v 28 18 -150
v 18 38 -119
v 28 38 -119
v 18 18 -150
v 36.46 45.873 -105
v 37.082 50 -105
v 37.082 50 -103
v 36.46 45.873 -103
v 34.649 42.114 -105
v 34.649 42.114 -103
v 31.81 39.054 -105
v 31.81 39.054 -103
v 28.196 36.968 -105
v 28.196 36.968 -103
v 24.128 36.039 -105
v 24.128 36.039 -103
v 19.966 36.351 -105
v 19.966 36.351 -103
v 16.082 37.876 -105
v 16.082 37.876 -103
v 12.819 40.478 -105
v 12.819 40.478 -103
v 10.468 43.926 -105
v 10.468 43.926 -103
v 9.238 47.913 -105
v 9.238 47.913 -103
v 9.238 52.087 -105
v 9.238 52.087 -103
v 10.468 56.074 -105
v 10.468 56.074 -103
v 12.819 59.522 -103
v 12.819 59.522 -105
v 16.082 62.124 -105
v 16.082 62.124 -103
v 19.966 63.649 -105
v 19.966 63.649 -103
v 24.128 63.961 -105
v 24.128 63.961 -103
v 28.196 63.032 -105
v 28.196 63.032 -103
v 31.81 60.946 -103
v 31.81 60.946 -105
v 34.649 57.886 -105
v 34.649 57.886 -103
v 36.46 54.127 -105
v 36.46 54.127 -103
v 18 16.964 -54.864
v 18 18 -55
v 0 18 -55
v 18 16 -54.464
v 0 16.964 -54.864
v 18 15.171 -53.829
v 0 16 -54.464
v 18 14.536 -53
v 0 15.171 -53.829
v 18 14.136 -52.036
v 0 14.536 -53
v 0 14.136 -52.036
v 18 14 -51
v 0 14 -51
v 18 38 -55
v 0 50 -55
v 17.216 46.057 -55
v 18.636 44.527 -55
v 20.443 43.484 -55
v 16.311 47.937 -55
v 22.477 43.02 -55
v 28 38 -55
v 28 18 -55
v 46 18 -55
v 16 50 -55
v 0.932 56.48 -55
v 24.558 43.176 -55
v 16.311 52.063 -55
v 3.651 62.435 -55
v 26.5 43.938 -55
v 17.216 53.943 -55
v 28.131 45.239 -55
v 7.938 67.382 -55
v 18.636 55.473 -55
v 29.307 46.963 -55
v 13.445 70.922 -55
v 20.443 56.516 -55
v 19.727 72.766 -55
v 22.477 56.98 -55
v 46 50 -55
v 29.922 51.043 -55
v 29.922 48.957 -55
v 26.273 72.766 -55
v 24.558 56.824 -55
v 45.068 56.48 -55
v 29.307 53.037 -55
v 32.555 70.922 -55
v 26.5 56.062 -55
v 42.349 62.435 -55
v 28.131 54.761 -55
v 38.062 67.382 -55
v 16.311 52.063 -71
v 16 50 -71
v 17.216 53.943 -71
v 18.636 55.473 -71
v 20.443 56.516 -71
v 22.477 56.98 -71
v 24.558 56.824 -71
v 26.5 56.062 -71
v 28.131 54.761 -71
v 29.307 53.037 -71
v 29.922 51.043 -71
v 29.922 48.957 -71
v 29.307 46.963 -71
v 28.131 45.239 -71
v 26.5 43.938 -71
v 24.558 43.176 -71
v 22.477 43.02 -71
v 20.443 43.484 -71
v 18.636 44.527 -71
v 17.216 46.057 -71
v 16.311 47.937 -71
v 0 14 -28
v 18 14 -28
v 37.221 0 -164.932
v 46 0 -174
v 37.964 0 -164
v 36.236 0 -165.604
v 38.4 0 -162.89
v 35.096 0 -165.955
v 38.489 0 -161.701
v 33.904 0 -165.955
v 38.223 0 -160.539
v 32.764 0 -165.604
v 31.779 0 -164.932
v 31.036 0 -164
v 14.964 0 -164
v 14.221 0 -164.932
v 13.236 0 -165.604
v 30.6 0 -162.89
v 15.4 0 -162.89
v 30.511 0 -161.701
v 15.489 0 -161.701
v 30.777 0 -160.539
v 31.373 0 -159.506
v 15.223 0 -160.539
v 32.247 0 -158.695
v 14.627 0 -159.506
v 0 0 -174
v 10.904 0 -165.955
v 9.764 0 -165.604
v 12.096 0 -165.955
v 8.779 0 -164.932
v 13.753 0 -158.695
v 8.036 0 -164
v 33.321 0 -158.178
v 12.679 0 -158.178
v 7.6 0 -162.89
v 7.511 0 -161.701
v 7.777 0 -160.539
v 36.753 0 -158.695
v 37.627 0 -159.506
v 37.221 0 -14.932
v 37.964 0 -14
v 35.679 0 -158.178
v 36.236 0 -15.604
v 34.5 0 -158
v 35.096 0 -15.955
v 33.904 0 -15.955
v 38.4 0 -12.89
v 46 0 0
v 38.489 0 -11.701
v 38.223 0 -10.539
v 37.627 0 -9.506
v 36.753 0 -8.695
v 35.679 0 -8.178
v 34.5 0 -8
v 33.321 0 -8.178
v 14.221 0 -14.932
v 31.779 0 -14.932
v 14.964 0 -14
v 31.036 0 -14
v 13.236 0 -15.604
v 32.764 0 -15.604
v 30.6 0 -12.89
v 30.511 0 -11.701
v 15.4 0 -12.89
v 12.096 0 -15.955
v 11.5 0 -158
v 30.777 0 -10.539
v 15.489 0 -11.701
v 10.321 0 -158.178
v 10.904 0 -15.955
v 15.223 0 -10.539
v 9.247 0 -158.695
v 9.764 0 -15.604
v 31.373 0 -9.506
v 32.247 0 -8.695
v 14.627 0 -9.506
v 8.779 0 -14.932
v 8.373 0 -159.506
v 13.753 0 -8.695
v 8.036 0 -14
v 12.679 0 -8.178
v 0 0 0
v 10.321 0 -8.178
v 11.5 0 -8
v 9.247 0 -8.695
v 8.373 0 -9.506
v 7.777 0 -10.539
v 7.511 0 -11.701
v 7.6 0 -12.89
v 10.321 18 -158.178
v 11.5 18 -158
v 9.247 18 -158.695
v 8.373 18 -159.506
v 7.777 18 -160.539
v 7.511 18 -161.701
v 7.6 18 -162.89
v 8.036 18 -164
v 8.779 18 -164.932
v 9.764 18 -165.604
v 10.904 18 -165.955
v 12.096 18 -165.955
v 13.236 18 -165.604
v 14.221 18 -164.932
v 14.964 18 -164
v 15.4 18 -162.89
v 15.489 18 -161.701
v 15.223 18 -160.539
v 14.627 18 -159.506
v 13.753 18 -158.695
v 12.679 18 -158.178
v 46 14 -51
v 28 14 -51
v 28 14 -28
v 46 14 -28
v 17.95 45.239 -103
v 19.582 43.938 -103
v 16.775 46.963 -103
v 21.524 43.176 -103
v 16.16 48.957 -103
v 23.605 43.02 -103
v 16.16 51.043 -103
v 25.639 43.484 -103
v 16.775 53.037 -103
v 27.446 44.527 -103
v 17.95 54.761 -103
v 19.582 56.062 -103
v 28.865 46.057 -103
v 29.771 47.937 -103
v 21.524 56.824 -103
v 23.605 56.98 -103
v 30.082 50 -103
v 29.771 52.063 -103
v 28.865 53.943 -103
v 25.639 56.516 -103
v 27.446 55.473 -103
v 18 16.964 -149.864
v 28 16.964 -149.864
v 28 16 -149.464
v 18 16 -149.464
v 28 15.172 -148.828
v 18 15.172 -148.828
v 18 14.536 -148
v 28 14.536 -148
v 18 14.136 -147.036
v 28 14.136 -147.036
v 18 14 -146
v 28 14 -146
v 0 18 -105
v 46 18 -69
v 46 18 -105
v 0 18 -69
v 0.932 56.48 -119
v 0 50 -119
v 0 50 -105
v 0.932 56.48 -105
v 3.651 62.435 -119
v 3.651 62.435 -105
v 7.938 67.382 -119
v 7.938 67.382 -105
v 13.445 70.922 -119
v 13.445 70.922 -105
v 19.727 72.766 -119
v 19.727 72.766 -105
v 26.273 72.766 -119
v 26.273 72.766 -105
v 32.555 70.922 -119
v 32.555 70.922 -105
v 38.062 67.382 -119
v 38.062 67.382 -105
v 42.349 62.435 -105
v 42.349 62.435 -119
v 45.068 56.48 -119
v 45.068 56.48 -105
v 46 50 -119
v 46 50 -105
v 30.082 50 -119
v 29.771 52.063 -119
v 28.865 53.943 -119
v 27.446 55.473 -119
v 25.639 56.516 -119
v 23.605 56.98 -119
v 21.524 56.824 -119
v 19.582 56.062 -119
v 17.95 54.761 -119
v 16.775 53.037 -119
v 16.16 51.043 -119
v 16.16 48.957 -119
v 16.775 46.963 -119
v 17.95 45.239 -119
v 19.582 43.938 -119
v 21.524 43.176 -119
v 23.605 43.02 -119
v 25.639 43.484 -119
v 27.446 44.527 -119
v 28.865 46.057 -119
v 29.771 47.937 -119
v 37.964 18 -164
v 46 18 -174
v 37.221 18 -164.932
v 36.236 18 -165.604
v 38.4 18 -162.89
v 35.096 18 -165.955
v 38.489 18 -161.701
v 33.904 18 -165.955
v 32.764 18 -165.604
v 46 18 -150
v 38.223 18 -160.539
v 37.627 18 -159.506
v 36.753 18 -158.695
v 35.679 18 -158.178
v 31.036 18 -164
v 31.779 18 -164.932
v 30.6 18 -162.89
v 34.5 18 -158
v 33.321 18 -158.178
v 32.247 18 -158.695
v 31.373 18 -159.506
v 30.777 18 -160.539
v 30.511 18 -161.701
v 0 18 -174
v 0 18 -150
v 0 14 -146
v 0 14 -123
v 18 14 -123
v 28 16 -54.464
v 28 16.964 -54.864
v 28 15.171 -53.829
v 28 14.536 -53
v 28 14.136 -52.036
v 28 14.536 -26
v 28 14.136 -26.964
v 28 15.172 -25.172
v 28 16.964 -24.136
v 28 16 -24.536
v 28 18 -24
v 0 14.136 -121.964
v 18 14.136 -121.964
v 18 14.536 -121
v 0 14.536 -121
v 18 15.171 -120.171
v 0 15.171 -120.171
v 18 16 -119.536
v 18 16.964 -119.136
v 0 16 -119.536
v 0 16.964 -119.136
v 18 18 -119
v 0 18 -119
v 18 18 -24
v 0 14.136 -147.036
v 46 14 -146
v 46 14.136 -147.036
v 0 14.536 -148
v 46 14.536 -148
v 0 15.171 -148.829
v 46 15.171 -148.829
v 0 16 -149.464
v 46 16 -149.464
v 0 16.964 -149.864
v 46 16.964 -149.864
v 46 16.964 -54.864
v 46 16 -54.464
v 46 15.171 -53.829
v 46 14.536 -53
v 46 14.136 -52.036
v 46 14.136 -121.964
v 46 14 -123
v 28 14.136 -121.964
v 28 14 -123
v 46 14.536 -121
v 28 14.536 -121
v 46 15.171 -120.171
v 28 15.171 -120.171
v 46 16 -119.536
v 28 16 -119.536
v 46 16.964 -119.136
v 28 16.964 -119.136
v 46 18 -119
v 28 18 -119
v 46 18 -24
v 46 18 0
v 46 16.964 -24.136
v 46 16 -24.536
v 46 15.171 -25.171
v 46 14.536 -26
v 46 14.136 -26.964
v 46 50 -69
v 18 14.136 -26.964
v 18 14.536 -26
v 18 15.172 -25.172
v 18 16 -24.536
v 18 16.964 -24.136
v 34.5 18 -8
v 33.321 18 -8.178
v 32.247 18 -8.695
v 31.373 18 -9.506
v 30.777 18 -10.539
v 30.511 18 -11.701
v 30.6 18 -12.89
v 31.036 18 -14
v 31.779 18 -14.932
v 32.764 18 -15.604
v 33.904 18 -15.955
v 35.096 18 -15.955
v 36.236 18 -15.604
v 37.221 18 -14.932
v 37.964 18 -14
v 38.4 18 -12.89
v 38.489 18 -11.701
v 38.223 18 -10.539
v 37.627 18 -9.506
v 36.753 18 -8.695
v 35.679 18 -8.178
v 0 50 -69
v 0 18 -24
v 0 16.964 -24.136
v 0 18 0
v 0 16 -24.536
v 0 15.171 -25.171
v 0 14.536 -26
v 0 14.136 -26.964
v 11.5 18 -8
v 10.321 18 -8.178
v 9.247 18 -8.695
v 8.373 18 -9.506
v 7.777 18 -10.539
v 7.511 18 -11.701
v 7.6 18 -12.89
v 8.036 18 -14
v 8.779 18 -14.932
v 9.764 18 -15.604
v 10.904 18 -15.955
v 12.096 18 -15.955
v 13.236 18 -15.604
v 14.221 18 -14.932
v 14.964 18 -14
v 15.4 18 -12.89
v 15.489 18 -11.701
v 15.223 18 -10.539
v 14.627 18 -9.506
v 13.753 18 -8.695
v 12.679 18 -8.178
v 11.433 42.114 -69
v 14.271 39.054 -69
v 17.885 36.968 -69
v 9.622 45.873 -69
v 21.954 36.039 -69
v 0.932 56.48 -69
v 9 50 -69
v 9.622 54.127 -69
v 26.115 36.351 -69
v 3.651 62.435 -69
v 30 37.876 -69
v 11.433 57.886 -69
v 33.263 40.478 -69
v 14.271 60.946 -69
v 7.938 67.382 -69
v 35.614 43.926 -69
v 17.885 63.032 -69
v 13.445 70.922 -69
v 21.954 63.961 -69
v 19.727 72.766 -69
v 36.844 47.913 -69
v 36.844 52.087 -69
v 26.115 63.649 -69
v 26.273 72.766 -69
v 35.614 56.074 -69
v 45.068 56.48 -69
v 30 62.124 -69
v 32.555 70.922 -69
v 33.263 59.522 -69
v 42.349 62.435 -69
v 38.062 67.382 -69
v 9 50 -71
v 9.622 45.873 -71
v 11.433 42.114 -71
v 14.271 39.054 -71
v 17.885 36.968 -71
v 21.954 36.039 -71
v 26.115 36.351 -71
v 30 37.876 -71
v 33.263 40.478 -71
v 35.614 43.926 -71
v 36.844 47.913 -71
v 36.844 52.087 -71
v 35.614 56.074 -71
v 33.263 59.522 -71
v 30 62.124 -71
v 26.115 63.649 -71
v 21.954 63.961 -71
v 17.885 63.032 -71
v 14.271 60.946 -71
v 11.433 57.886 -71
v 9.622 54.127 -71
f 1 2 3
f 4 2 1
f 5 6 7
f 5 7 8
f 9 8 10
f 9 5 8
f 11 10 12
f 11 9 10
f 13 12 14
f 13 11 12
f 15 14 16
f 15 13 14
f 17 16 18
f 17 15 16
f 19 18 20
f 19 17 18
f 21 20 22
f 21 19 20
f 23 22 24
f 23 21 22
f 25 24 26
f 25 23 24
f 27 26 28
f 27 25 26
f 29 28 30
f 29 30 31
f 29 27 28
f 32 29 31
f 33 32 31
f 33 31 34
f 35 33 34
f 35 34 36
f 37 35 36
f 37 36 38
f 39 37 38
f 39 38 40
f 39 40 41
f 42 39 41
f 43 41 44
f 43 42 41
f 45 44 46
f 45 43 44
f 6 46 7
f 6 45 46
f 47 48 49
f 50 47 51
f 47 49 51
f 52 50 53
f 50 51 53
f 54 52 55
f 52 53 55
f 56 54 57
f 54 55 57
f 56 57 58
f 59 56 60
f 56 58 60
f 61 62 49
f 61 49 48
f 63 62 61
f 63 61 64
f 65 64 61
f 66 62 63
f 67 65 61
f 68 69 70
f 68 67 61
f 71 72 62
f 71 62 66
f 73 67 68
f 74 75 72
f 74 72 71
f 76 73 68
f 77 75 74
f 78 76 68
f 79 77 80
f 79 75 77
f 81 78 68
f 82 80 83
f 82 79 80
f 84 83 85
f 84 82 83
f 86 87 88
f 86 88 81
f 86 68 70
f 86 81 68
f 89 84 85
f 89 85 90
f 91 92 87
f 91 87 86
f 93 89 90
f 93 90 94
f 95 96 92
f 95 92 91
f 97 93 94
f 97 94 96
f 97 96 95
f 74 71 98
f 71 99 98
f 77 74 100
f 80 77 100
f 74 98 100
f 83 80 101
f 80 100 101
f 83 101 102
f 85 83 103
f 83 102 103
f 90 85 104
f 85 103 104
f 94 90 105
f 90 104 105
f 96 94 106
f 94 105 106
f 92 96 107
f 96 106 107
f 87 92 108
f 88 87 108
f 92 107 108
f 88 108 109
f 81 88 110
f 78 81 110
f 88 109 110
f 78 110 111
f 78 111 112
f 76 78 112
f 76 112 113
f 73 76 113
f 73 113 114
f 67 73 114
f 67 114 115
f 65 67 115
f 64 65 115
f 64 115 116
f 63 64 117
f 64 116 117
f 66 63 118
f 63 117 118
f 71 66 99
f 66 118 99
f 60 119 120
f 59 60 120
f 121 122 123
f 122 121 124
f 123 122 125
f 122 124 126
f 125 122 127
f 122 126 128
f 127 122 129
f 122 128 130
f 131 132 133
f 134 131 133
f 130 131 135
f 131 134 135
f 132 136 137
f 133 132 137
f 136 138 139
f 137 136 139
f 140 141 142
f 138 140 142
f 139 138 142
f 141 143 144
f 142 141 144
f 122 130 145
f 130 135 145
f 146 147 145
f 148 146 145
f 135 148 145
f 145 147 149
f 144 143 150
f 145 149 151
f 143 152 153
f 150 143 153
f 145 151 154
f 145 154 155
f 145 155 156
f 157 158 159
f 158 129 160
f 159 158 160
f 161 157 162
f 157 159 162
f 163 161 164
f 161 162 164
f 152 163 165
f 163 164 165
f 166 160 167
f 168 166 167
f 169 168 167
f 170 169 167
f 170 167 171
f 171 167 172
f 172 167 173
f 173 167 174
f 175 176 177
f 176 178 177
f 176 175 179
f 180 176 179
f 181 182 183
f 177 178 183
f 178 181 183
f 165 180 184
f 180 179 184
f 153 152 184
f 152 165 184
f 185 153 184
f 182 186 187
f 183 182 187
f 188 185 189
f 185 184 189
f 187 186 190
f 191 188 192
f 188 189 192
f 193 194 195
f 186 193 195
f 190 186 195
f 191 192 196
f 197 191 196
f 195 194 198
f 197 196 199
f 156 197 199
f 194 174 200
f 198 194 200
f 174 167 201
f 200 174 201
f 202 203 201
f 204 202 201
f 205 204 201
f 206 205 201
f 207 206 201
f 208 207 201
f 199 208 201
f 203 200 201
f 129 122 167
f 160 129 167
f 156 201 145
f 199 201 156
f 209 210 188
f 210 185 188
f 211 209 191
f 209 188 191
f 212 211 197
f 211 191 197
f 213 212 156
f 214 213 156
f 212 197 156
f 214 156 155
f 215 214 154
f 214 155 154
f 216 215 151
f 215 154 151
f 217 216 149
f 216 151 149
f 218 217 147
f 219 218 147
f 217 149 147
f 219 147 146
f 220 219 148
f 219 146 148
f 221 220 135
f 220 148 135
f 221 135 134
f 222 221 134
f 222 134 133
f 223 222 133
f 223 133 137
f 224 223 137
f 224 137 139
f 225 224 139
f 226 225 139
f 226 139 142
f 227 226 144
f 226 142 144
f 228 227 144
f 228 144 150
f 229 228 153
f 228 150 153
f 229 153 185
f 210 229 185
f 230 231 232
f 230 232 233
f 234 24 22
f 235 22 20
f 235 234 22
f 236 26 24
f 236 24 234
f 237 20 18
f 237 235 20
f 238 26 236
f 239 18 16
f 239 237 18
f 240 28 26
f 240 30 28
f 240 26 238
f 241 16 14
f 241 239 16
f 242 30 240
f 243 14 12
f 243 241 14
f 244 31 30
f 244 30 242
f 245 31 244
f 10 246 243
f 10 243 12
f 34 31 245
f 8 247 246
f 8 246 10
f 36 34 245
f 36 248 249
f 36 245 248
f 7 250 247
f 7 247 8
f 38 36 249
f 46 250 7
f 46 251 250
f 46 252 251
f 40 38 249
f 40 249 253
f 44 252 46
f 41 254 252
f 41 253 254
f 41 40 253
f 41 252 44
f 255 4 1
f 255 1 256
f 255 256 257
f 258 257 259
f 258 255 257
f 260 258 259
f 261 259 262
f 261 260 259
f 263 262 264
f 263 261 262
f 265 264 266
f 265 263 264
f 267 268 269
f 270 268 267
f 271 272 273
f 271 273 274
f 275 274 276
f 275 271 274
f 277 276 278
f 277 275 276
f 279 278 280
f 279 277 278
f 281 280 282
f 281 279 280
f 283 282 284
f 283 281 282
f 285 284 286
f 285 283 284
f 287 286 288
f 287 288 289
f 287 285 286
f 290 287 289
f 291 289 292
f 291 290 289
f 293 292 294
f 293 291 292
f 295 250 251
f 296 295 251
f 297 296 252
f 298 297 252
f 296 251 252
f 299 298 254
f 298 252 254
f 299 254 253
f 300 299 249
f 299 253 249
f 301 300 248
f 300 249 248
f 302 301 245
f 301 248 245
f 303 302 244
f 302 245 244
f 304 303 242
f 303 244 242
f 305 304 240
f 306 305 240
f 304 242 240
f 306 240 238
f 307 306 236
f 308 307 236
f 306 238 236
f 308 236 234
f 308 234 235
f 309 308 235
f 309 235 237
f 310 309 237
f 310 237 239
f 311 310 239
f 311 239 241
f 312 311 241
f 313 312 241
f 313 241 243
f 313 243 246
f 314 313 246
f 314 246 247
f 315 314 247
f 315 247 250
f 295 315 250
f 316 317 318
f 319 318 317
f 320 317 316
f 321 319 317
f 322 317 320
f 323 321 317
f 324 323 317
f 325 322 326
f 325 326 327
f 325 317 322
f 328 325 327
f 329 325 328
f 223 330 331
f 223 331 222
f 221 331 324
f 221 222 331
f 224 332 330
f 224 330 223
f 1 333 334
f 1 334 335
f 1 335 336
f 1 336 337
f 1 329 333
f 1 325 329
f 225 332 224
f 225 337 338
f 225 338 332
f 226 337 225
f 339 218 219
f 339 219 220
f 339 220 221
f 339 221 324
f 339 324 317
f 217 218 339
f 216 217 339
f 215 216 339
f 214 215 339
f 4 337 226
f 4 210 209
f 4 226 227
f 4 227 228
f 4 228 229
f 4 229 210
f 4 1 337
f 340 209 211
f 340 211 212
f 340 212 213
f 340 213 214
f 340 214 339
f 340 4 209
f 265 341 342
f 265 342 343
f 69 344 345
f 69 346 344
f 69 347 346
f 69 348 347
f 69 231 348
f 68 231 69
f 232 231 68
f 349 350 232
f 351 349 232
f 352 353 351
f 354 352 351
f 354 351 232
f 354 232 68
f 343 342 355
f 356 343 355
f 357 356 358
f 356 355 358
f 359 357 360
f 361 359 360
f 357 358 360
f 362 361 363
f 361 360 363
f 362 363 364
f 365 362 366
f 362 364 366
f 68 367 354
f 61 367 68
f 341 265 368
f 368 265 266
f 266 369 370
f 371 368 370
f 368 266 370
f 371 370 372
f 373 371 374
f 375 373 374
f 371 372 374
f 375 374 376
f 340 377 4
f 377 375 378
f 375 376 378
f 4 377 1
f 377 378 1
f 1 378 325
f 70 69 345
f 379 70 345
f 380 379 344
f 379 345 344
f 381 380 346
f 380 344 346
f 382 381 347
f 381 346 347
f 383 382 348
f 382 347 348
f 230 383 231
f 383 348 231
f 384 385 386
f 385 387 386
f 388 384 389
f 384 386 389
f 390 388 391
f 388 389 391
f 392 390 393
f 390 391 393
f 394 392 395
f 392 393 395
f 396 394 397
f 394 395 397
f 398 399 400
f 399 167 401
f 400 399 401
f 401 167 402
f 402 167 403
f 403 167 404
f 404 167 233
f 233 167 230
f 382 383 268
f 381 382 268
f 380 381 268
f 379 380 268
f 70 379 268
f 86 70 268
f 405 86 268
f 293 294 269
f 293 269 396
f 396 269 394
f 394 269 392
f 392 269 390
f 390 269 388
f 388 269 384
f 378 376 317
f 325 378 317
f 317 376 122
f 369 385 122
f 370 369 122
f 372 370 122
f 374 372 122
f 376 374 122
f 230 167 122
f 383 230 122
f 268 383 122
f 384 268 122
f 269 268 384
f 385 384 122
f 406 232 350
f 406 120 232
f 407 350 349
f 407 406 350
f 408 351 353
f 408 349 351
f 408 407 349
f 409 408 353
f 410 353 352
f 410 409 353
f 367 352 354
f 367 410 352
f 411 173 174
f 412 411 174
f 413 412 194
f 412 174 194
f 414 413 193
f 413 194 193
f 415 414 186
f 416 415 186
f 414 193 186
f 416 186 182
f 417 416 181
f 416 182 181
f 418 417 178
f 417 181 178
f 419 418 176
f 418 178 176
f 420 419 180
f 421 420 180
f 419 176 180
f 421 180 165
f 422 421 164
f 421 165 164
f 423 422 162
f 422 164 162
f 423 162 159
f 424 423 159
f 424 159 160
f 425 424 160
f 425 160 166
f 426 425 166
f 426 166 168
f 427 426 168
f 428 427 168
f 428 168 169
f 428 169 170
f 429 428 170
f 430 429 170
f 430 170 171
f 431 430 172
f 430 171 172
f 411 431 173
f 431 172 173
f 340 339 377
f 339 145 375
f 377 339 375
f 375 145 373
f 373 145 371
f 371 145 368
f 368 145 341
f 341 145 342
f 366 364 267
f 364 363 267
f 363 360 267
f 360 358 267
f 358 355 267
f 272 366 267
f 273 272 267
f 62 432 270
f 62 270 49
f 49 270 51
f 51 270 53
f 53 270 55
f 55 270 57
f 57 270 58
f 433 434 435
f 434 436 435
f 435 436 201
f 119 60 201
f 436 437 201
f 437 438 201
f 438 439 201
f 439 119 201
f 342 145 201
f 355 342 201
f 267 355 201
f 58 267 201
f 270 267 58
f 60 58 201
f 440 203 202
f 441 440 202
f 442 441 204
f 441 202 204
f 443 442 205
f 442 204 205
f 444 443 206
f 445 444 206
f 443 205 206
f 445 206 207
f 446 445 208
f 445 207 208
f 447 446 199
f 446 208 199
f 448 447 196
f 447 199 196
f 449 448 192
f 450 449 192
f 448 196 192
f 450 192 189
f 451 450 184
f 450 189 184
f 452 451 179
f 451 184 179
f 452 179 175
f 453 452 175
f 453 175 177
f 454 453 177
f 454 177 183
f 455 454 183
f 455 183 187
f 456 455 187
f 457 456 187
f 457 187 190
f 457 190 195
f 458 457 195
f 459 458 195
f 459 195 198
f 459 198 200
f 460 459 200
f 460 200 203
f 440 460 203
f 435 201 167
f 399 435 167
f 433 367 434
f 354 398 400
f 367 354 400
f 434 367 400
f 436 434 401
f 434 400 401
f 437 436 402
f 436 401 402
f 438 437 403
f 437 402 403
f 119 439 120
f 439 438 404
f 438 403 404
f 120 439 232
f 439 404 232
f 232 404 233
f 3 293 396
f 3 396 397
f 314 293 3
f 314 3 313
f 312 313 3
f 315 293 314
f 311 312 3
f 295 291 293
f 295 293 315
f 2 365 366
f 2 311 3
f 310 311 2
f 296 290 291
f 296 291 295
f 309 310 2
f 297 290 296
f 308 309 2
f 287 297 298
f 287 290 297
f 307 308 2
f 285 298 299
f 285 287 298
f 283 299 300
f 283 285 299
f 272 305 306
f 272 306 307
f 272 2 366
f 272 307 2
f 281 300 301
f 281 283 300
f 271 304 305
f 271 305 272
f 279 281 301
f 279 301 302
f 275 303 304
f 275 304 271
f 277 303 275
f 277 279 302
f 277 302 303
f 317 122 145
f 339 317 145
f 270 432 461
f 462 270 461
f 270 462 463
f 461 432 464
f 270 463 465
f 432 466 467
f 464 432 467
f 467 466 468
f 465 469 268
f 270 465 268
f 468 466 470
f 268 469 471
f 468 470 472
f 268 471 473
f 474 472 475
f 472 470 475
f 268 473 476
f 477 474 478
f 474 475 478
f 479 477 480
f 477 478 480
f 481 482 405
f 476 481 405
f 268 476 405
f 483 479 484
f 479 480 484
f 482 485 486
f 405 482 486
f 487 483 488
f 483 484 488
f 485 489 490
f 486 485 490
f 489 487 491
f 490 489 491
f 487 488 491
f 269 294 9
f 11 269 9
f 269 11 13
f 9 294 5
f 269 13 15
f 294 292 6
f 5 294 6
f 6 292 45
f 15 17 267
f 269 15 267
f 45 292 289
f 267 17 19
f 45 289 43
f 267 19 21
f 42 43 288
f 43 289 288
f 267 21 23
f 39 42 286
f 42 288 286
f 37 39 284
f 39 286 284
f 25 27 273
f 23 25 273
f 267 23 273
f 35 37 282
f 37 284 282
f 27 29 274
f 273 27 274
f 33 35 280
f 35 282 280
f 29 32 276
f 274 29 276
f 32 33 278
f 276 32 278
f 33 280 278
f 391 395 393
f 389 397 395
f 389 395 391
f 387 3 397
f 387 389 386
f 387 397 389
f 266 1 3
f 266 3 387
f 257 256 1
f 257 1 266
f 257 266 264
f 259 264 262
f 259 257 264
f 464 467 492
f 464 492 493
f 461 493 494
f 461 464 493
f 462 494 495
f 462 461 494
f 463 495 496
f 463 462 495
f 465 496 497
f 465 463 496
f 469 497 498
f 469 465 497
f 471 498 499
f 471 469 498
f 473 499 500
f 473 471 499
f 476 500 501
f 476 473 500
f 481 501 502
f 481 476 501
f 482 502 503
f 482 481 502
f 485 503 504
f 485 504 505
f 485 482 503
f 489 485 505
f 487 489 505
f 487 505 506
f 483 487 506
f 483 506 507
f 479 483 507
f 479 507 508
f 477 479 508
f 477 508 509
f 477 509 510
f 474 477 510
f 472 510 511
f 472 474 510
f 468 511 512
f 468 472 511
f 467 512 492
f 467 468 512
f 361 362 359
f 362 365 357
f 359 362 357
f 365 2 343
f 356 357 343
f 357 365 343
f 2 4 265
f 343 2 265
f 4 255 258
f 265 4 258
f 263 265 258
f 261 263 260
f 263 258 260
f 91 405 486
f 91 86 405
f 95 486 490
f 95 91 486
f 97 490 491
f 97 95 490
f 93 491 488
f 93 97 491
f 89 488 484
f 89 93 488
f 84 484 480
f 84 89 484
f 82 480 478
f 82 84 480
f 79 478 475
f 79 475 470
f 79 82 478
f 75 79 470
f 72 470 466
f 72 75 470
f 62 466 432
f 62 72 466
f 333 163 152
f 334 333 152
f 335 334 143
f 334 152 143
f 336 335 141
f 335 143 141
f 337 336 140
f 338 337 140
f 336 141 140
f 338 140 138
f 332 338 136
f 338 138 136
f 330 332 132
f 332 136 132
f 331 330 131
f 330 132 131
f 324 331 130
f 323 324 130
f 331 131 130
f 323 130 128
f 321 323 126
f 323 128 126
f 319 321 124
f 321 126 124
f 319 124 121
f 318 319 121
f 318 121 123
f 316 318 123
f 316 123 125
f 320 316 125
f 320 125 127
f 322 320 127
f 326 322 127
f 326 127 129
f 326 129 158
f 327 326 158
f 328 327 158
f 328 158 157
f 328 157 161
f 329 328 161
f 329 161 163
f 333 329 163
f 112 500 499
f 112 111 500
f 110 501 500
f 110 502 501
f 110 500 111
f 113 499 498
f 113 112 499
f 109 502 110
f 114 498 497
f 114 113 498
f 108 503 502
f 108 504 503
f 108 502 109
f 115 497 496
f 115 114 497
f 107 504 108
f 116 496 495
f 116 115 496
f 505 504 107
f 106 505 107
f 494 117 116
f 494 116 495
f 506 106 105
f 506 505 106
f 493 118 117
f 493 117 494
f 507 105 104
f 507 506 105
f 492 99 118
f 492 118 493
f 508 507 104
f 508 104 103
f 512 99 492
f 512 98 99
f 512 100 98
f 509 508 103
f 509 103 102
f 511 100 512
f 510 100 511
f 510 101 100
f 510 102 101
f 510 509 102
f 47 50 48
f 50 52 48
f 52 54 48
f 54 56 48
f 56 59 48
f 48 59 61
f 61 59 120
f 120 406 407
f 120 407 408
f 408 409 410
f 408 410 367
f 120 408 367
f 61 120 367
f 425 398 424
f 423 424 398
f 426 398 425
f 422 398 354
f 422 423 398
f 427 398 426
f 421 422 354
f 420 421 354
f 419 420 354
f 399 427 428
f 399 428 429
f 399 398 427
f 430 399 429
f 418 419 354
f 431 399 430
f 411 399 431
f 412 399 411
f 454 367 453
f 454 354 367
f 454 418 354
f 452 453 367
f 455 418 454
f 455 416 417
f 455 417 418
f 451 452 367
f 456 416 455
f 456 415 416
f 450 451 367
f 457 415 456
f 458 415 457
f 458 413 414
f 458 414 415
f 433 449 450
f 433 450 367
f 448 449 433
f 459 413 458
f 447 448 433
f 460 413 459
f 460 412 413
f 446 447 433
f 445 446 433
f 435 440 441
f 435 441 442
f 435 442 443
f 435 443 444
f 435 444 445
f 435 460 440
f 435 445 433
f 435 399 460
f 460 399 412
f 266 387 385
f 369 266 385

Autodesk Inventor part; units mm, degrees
ref_plane "XZ Plane" through (0, 0, 0) normal (0, 1, 0) x (-1, 0, 0)
sketch "Sketch1" plane through (0, 0, 0) normal (0, 1, 0) x (-1, 0, 0)
  line L0 (0, 0) -> (-46, 0)
  line L1 (-46, 0) -> (-46, -174)
  line L2 (-46, -174) -> (0, -174)
  line L3 (0, -174) -> (0, 0)
  dimension "d0" = 46
  dimension "d1" = 174
extrude "Extrusion1" add sketch "Sketch1" along normal blind 18
sketch "Sketch2" plane through (0, 18, 0) normal (0, 1, 0) x (1, 0, 0)
  line L0 (0, 0) -> (0, 24)
  line L1 (0, 174) -> (0, 0) projected
  line L2 (46, 0) -> (46, 174) projected
  line L3 (0, 24) -> (46, 24)
  line L4 (46, 24) -> (46, 55)
  line L5 (46, 55) -> (0, 55)
  line L6 (0, 55) -> (0, 24)
  line L7 (0, 174) -> (0, 150)
  line L8 (0, 150) -> (46, 150)
  line L9 (46, 150) -> (46, 119)
  line L10 (46, 119) -> (0, 119)
  line L11 (0, 119) -> (0, 150)
  dimension "d4" = 24
  dimension "d5" = 31
  dimension "d6" = 24
  dimension "d7" = 31
extrude "Extrusion2" cut sketch "Sketch2" against normal blind 4 contours L8 L2 L10 L1 | L5 L2 L3 L1
fillet "Fillet1" radius 4 4 edges at (23, 14, -24) (23, 14, -119) (23, 14, -55) (23, 14, -150)
sketch "Sketch3" plane through (0, 18, 0) normal (0, 1, 0) x (1, 0, 0)
  line L0 (46, 150) -> (46, 174) projected
  line L1 (46, 162) -> (0, 162)
  line L2 (46, 174) -> (0, 174) projected
  line L3 (23, 174) -> (23, 150)
  line L4 (23, 174) -> (34.5, 174)
  line L5 (34.5, 174) -> (34.5, 150)
  line L6 (0, 150) -> (46, 150) projected
  line L7 (23, 174) -> (11.5, 174)
  line L8 (11.5, 174) -> (11.5, 150)
  line L9 (0, 0) -> (46, 0) projected
  line L10 (23, 0) -> (23, 24)
  line L11 (46, 24) -> (0, 24) projected
  line L12 (46, 0) -> (46, 174) projected
  line L13 (46, 12) -> (0, 12)
  line L14 (34.5, 0) -> (34.5, 24)
  line L15 (11.5, 0) -> (11.5, 24)
  circle A0 centre (34.5, 12) radius 4
  circle A1 centre (11.5, 12) radius 4
  circle A2 centre (34.5, 162) radius 4
  circle A3 centre (11.5, 162) radius 4
  dimension "d11" = 11.5
  dimension "d12" = 11.5
  dimension "d13" = 8
  dimension "d14" = 8
  dimension "d15" = 8
  dimension "d16" = 8
hole "Hole1" at (34.5, 18, -12) at (11.5, 18, -12) at (34.5, 18, -162) at (11.5, 18, -162) direction (0, -1, 0) diameter 8 depth 18 tip angle 120
sketch "Sketch4" plane through (0, 18, 0) normal (0, 1, 0) x (1, 0, 0)
  line L0 (0, 55) -> (46, 55) projected
  line L1 (46, 0) -> (46, 174) projected
  line L2 (0, 55) -> (46, 55)
  line L3 (46, 55) -> (46, 69)
  line L4 (46, 69) -> (0, 69)
  line L5 (0, 69) -> (0, 55)
  line L6 (46, 119) -> (0, 119) projected
  line L7 (0, 119) -> (46, 119)
  line L8 (46, 119) -> (46, 105)
  line L9 (46, 105) -> (0, 105)
  line L10 (0, 105) -> (0, 119)
  point P0 (0, 0)
  dimension "d24" = 14
  dimension "d25" = 14
extrude "Extrusion3" add sketch "Sketch4" along normal blind 32
sketch "Sketch8" plane through (46, 18, -119) normal (0, 0, -1) x (-1, 0, 0)
  line L0 (0, 32) -> (46, 32) projected
  circle A0 centre (23, 32) radius 23
  point P0 (46, -18)
  dimension "d35" = 46
sketch "Sketch9" plane through (0, 18, -55) normal (0, 0, 1) x (1, 0, 0)
  line L0 (46, 32) -> (0, 32) projected
  circle A0 centre (23, 32) radius 23
  point P0 (0, -18)
  dimension "d36" = 46
extrude "Extrusion6" add sketch "Sketch9" against normal blind 14 contours L0 A0 picked at (25.7186, 39.1685)
extrude "Extrusion7" add sketch "Sketch8" against normal blind 14 contours A0 L0 picked at (25.7186, 39.1685)
sketch "Sketch14" plane through (46, 18, -69) normal (0, 0, -1) x (-1, 0, 0)
  line L0 (0, -18) -> (46, -18) projected
  line L1 (0, -18) -> (0, 32)
  line L2 (0, 32) -> (46, 32)
  circle A0 centre (23, 32) radius 14
  dimension "d51" = 50
  dimension "d52" = 28
extrude "Extrusion10" add sketch "Sketch14" along normal blind 2
sketch "Sketch15" plane through (0, 18, -105) normal (0, 0, 1) x (1, 0, 0)
  line L0 (0, -18) -> (0, 32)
  line L1 (0, 32) -> (46.1632, 32)
  line L2 (0, -18) -> (0, 0) projected
  circle A0 centre (23.0816, 32) radius 14
  dimension "d55" = 50
  dimension "d56" = 28
extrude "Extrusion11" add sketch "Sketch15" along normal blind 2
sketch "Sketch16" plane through (23, 50, -71) normal (0, 0, -1) x (-1, 0, 0)
  circle A0 centre (0, 0) radius 7
  point P0 (23, -50)
  dimension "d59" = 14
extrude "Extrusion12" cut sketch "Sketch16" against normal blind 16
sketch "Sketch17" plane through (23.0816, 50, -103) normal (0, 0, 1) x (1, 0, 0)
  circle A0 centre (0, 0) radius 7
  point P0 (-23.0816, -50)
  dimension "d62" = 14
extrude "Extrusion13" cut sketch "Sketch17" against normal blind 16
ref_plane "Work Plane1" through (23, 0, 0) normal (1, 0, 0) x (0, 1, 0)
sketch "Sketch21" plane through (23, 0, 0) normal (1, 0, 0) x (0, 1, 0)
  line L0 (18, -55) -> (50, -55) projected
  line L1 (50, -55) -> (38, -55)
  line L2 (38, -55) -> (14, -55)
  line L3 (14, -55) -> (14, -24)
  arc A0 (18, -24) -> (14, -28) centre (18, -28) ccw projected
  line L4 (14, -24) -> (18, -24)
  line L5 (18, -24) -> (38, -55)
  line L6 (14, -55) -> (38, -55)
  line L7 (18, -24) -> (14, -24)
  line L8 (14, -55) -> (14, -24)
  line L9 (18, -24) -> (14, -24)
  point P0 (0, 0)
  dimension "d73" = 12
extrude "Extrusion16" add sketch "Sketch21" along normal mid plane 10 contours L2 L3 A0 L5 L0
ref_plane "Work Plane2" through (0, 0, -87) normal (0, 0, 1) x (1, 0, 0)
mirror "Mirror1" about plane through (0, 0, -87) normal (0, 0, 1) of "Extrusion16"
properties part number "Semelle" material "Iron, Cast"
